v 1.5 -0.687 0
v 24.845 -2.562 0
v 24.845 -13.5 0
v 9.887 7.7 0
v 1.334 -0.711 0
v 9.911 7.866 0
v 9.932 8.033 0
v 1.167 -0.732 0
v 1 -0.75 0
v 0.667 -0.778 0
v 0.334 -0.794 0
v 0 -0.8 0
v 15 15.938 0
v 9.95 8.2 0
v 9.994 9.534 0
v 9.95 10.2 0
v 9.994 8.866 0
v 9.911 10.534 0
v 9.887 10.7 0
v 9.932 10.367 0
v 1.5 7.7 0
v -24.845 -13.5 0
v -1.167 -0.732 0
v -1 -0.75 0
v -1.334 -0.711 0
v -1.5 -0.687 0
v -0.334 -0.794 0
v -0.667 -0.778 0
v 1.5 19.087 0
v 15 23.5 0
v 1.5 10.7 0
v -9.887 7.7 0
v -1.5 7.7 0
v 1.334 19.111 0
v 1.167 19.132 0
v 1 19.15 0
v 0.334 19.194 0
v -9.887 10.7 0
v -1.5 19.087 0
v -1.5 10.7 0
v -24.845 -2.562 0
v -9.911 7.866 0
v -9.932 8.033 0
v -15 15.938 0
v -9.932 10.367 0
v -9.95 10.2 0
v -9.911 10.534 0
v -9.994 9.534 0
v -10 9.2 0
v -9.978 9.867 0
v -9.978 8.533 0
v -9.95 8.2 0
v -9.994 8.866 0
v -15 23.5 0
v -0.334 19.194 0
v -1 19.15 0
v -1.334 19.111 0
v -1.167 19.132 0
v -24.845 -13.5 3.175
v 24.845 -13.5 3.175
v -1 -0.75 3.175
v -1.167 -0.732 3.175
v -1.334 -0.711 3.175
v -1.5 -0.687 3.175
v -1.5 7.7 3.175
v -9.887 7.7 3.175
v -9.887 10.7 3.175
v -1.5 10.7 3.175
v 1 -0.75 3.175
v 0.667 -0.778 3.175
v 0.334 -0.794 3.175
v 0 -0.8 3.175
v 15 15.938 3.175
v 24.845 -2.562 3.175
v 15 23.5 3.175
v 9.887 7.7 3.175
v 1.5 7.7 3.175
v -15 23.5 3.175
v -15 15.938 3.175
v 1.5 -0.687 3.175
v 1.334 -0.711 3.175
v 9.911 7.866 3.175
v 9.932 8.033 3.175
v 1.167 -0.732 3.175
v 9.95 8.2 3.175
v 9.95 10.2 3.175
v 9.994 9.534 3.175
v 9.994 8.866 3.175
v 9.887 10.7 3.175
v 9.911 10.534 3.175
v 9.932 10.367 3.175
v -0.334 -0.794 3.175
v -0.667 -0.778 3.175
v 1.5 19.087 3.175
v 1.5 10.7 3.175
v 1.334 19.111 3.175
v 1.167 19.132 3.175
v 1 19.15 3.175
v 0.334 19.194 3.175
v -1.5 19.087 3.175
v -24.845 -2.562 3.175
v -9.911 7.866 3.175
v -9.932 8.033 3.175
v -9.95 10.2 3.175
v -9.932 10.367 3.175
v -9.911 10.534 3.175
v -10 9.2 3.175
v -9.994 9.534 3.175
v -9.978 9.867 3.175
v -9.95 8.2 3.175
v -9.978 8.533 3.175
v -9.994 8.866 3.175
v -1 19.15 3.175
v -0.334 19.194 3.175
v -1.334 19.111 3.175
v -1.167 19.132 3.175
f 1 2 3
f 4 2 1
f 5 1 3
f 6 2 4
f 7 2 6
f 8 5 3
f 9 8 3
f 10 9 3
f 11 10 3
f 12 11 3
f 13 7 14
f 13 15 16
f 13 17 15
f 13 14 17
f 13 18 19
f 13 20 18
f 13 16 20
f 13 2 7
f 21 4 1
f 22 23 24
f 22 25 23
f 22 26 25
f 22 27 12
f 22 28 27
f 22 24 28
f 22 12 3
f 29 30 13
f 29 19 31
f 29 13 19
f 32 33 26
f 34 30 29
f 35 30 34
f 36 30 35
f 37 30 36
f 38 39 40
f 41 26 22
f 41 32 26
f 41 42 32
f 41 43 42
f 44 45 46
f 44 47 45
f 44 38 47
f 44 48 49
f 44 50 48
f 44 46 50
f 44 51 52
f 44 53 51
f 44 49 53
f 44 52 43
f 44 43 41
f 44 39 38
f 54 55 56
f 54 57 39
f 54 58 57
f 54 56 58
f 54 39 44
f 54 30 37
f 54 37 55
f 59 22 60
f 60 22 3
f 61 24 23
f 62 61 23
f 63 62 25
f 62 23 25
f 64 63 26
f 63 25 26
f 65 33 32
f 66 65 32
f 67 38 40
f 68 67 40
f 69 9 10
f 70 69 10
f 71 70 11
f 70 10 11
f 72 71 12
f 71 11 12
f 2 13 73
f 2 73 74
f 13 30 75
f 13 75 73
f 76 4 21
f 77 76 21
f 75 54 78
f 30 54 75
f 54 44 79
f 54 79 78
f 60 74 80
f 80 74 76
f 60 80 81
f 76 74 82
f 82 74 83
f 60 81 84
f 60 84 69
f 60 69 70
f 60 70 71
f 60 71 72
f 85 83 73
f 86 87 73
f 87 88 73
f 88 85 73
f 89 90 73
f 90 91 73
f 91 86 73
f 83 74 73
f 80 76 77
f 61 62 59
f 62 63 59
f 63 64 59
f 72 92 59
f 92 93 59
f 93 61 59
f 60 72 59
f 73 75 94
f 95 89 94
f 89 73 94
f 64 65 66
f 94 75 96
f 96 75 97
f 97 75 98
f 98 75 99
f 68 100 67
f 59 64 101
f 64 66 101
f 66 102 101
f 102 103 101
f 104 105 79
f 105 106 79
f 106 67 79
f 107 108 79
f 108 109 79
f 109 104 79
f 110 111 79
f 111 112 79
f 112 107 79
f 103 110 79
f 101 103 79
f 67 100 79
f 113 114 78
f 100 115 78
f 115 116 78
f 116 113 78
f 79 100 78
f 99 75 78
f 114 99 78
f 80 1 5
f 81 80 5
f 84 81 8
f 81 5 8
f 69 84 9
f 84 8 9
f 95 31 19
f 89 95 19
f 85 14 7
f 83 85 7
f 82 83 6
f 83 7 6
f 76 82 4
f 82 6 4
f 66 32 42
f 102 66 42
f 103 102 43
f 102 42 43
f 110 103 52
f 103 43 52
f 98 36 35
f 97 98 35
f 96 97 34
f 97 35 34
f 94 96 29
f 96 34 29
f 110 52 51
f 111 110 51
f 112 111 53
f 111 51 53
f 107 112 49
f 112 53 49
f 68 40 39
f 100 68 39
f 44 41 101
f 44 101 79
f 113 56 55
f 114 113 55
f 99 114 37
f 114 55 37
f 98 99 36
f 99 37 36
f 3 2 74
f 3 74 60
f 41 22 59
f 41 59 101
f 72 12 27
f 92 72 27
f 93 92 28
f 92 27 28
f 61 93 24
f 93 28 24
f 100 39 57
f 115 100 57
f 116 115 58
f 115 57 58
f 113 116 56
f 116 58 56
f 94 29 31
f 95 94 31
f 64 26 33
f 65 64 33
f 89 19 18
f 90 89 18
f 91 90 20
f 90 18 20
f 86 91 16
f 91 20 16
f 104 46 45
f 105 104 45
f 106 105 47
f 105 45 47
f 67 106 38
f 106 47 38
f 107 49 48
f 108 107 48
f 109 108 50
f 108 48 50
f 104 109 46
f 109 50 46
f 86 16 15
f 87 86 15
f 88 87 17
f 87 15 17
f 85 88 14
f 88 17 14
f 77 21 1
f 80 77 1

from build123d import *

# Parameters (mm, degrees)
SKETCH1_W           = 49.69
SKETCH1_H           = 27
BOSS_EXTRUDE1_DEPTH = 3.175
CUT_EXTRUDE1_DEPTH  = 3.175
BOSS_EXTRUDE2_DEPTH = 3.175
BOSS_EXTRUDE3_DEPTH = 3.175
CUT_EXTRUDE2_DEPTH  = 3.175
CUT_EXTRUDE3_DEPTH  = 3.175


with BuildPart() as part:
    # Sketch1 → Boss-Extrude1 (new body)
    with BuildSketch(Plane.XY):
        Rectangle(SKETCH1_W, SKETCH1_H)
    extrude(amount=BOSS_EXTRUDE1_DEPTH)

    # Sketch2 → Cut-Extrude1 (cut)
    with BuildSketch(Plane.XY):
        Polygon((10, 6.75), (24.845, -6.75), (24.845, 0), (24.845, 13.5), (10, 13.5), align=None)
        Polygon((-24.845, 13.5), (-24.845, -6.75), (-10, 6.75), (-10, 13.5), align=None)
    extrude(amount=CUT_EXTRUDE1_DEPTH, mode=Mode.SUBTRACT)

    # Sketch3 → Boss-Extrude2 (add)
    with BuildSketch(Plane(origin=(0, 0, 0), x_dir=(-1, 0, 0), z_dir=(0, 0, -1))):
        with BuildLine():
            Line((-24.845, -2.5625), (-24.845, -6.75))
            Line((-24.845, -6.75), (-10, 6.75))
            Line((-10, 6.75), (-10, 13.5))
            Line((-10, 13.5), (-9.028288874, 13.5))
            ThreePointArc((-9.028288874, 13.5), (0, 19.2), (9.028288874, 13.5))
            Line((9.028288874, 13.5), (10, 13.5))
            Line((10, 13.5), (10, 6.75))
            Line((10, 6.75), (24.845, -6.75))
            Line((24.845, -6.75), (24.845, -2.5625))
            Line((24.845, -2.5625), (15, 15.9375))
            Line((15, 15.9375), (15, 23.5))
            Line((15, 23.5), (-15, 23.5))
            Line((-15, 23.5), (-15, 15.9375))
            Line((-15, 15.9375), (-24.845, -2.5625))
        make_face()
    extrude(amount=-BOSS_EXTRUDE2_DEPTH)

    # Sketch4 → Boss-Extrude3 (add)
    # profile 1 of 2: a face of its own
    with BuildSketch(Plane(origin=(0, 0, 0), x_dir=(-1, 0, 0), z_dir=(0, 0, -1))):
        Polygon((-24.845, -2.5625), (-24.845, -13.5), (0, -13.5), (24.845, -13.5), (24.845, -2.5625), (15, 15.9375), (15, 23.5), (-15, 23.5), (-15, 15.9375), align=None)
        with BuildLine():
            ThreePointArc((10, 9.2), (7.071067812, 2.128932188), (0, -0.8))
            ThreePointArc((0, -0.8), (-8.455767263, 3.861460874), (-9.028288874, 13.5))
            ThreePointArc((-9.028288874, 13.5), (0, 19.2), (9.028288874, 13.5))
            ThreePointArc((9.028288874, 13.5), (9.754047589, 11.404213154), (10, 9.2))
        make_face(mode=Mode.SUBTRACT)
    # profile 2 of 2: a face of its own
    with BuildSketch(Plane(origin=(0, 0, 0), x_dir=(-1, 0, 0), z_dir=(0, 0, -1))):
        with BuildLine():
            ThreePointArc((-9.028288874, 13.5), (0, 19.2), (9.028288874, 13.5))
            Line((9.028288874, 13.5), (-9.028288874, 13.5))
        make_face()
    extrude(amount=-BOSS_EXTRUDE3_DEPTH)

    # Sketch5 → Cut-Extrude2 (cut)
    with BuildSketch(Plane(origin=(0, 0, 0), x_dir=(-1, 0, 0), z_dir=(0, 0, -1))):
        with BuildLine():
            Line((9.949874371, 10.2), (1, 10.2))
            Line((1, 10.2), (1, 19.149874371))
            ThreePointArc((1, 19.149874371), (0, 19.2), (-1, 19.149874371))
            Line((-1, 19.149874371), (-1, 10.2))
            Line((-1, 10.2), (-9.949874371, 10.2))
            ThreePointArc((-9.949874371, 10.2), (-10, 9.2), (-9.949874371, 8.2))
            Line((-9.949874371, 8.2), (-1, 8.2))
            Line((-1, 8.2), (-1, -0.749874371))
            ThreePointArc((-1, -0.749874371), (-0.500627751, -0.787460731), (0, -0.8))
            ThreePointArc((0, -0.8), (0.500627751, -0.787460731), (1, -0.749874371))
            Line((1, -0.749874371), (1, 8.2))
            Line((1, 8.2), (9.949874371, 8.2))
            ThreePointArc((9.949874371, 8.2), (9.987460731, 8.699372249), (10, 9.2))
            ThreePointArc((10, 9.2), (9.987460731, 9.700627751), (9.949874371, 10.2))
        make_face()
    extrude(amount=-CUT_EXTRUDE2_DEPTH, mode=Mode.SUBTRACT)

    # Sketch6 → Cut-Extrude3 (cut)
    with BuildSketch(Plane(origin=(0, 0, 0), x_dir=(-1, 0, 0), z_dir=(0, 0, -1))):
        with BuildLine():
            Line((1.5, 10.7), (1.5, 19.086859967))
            ThreePointArc((1.5, 19.086859967), (1.250397018, 19.121517389), (1, 19.149874371))
            Line((1, 19.149874371), (1, 10.2))
            Line((1, 10.2), (9.949874371, 10.2))
            ThreePointArc((9.949874371, 10.2), (9.921517389, 10.450397018), (9.886859967, 10.7))
            Line((9.886859967, 10.7), (1.5, 10.7))
        make_face()
        with BuildLine():
            Line((-1, 10.2), (-1, 19.149874371))
            ThreePointArc((-1, 19.149874371), (-1.250397018, 19.121517389), (-1.5, 19.086859967))
            Line((-1.5, 19.086859967), (-1.5, 10.7))
            Line((-1.5, 10.7), (-9.886859967, 10.7))
            ThreePointArc((-9.886859967, 10.7), (-9.921517389, 10.450397018), (-9.949874371, 10.2))
            Line((-9.949874371, 10.2), (-1, 10.2))
        make_face()
        with BuildLine():
            ThreePointArc((9.886859967, 7.7), (9.921517389, 7.949602982), (9.949874371, 8.2))
            Line((9.949874371, 8.2), (1, 8.2))
            Line((1, 8.2), (1, -0.749874371))
            ThreePointArc((1, -0.749874371), (1.250397018, -0.721517389), (1.5, -0.686859967))
            Line((1.5, -0.686859967), (1.5, 7.7))
            Line((1.5, 7.7), (9.886859967, 7.7))
        make_face()
        with BuildLine():
            Line((-1, -0.749874371), (-1, 8.2))
            Line((-1, 8.2), (-9.949874371, 8.2))
            ThreePointArc((-9.949874371, 8.2), (-9.921517389, 7.949602982), (-9.886859967, 7.7))
            Line((-9.886859967, 7.7), (-1.5, 7.7))
            Line((-1.5, 7.7), (-1.5, -0.686859967))
            ThreePointArc((-1.5, -0.686859967), (-1.250397018, -0.721517389), (-1, -0.749874371))
        make_face()
    extrude(amount=-CUT_EXTRUDE3_DEPTH, mode=Mode.SUBTRACT)


solid = part.part
